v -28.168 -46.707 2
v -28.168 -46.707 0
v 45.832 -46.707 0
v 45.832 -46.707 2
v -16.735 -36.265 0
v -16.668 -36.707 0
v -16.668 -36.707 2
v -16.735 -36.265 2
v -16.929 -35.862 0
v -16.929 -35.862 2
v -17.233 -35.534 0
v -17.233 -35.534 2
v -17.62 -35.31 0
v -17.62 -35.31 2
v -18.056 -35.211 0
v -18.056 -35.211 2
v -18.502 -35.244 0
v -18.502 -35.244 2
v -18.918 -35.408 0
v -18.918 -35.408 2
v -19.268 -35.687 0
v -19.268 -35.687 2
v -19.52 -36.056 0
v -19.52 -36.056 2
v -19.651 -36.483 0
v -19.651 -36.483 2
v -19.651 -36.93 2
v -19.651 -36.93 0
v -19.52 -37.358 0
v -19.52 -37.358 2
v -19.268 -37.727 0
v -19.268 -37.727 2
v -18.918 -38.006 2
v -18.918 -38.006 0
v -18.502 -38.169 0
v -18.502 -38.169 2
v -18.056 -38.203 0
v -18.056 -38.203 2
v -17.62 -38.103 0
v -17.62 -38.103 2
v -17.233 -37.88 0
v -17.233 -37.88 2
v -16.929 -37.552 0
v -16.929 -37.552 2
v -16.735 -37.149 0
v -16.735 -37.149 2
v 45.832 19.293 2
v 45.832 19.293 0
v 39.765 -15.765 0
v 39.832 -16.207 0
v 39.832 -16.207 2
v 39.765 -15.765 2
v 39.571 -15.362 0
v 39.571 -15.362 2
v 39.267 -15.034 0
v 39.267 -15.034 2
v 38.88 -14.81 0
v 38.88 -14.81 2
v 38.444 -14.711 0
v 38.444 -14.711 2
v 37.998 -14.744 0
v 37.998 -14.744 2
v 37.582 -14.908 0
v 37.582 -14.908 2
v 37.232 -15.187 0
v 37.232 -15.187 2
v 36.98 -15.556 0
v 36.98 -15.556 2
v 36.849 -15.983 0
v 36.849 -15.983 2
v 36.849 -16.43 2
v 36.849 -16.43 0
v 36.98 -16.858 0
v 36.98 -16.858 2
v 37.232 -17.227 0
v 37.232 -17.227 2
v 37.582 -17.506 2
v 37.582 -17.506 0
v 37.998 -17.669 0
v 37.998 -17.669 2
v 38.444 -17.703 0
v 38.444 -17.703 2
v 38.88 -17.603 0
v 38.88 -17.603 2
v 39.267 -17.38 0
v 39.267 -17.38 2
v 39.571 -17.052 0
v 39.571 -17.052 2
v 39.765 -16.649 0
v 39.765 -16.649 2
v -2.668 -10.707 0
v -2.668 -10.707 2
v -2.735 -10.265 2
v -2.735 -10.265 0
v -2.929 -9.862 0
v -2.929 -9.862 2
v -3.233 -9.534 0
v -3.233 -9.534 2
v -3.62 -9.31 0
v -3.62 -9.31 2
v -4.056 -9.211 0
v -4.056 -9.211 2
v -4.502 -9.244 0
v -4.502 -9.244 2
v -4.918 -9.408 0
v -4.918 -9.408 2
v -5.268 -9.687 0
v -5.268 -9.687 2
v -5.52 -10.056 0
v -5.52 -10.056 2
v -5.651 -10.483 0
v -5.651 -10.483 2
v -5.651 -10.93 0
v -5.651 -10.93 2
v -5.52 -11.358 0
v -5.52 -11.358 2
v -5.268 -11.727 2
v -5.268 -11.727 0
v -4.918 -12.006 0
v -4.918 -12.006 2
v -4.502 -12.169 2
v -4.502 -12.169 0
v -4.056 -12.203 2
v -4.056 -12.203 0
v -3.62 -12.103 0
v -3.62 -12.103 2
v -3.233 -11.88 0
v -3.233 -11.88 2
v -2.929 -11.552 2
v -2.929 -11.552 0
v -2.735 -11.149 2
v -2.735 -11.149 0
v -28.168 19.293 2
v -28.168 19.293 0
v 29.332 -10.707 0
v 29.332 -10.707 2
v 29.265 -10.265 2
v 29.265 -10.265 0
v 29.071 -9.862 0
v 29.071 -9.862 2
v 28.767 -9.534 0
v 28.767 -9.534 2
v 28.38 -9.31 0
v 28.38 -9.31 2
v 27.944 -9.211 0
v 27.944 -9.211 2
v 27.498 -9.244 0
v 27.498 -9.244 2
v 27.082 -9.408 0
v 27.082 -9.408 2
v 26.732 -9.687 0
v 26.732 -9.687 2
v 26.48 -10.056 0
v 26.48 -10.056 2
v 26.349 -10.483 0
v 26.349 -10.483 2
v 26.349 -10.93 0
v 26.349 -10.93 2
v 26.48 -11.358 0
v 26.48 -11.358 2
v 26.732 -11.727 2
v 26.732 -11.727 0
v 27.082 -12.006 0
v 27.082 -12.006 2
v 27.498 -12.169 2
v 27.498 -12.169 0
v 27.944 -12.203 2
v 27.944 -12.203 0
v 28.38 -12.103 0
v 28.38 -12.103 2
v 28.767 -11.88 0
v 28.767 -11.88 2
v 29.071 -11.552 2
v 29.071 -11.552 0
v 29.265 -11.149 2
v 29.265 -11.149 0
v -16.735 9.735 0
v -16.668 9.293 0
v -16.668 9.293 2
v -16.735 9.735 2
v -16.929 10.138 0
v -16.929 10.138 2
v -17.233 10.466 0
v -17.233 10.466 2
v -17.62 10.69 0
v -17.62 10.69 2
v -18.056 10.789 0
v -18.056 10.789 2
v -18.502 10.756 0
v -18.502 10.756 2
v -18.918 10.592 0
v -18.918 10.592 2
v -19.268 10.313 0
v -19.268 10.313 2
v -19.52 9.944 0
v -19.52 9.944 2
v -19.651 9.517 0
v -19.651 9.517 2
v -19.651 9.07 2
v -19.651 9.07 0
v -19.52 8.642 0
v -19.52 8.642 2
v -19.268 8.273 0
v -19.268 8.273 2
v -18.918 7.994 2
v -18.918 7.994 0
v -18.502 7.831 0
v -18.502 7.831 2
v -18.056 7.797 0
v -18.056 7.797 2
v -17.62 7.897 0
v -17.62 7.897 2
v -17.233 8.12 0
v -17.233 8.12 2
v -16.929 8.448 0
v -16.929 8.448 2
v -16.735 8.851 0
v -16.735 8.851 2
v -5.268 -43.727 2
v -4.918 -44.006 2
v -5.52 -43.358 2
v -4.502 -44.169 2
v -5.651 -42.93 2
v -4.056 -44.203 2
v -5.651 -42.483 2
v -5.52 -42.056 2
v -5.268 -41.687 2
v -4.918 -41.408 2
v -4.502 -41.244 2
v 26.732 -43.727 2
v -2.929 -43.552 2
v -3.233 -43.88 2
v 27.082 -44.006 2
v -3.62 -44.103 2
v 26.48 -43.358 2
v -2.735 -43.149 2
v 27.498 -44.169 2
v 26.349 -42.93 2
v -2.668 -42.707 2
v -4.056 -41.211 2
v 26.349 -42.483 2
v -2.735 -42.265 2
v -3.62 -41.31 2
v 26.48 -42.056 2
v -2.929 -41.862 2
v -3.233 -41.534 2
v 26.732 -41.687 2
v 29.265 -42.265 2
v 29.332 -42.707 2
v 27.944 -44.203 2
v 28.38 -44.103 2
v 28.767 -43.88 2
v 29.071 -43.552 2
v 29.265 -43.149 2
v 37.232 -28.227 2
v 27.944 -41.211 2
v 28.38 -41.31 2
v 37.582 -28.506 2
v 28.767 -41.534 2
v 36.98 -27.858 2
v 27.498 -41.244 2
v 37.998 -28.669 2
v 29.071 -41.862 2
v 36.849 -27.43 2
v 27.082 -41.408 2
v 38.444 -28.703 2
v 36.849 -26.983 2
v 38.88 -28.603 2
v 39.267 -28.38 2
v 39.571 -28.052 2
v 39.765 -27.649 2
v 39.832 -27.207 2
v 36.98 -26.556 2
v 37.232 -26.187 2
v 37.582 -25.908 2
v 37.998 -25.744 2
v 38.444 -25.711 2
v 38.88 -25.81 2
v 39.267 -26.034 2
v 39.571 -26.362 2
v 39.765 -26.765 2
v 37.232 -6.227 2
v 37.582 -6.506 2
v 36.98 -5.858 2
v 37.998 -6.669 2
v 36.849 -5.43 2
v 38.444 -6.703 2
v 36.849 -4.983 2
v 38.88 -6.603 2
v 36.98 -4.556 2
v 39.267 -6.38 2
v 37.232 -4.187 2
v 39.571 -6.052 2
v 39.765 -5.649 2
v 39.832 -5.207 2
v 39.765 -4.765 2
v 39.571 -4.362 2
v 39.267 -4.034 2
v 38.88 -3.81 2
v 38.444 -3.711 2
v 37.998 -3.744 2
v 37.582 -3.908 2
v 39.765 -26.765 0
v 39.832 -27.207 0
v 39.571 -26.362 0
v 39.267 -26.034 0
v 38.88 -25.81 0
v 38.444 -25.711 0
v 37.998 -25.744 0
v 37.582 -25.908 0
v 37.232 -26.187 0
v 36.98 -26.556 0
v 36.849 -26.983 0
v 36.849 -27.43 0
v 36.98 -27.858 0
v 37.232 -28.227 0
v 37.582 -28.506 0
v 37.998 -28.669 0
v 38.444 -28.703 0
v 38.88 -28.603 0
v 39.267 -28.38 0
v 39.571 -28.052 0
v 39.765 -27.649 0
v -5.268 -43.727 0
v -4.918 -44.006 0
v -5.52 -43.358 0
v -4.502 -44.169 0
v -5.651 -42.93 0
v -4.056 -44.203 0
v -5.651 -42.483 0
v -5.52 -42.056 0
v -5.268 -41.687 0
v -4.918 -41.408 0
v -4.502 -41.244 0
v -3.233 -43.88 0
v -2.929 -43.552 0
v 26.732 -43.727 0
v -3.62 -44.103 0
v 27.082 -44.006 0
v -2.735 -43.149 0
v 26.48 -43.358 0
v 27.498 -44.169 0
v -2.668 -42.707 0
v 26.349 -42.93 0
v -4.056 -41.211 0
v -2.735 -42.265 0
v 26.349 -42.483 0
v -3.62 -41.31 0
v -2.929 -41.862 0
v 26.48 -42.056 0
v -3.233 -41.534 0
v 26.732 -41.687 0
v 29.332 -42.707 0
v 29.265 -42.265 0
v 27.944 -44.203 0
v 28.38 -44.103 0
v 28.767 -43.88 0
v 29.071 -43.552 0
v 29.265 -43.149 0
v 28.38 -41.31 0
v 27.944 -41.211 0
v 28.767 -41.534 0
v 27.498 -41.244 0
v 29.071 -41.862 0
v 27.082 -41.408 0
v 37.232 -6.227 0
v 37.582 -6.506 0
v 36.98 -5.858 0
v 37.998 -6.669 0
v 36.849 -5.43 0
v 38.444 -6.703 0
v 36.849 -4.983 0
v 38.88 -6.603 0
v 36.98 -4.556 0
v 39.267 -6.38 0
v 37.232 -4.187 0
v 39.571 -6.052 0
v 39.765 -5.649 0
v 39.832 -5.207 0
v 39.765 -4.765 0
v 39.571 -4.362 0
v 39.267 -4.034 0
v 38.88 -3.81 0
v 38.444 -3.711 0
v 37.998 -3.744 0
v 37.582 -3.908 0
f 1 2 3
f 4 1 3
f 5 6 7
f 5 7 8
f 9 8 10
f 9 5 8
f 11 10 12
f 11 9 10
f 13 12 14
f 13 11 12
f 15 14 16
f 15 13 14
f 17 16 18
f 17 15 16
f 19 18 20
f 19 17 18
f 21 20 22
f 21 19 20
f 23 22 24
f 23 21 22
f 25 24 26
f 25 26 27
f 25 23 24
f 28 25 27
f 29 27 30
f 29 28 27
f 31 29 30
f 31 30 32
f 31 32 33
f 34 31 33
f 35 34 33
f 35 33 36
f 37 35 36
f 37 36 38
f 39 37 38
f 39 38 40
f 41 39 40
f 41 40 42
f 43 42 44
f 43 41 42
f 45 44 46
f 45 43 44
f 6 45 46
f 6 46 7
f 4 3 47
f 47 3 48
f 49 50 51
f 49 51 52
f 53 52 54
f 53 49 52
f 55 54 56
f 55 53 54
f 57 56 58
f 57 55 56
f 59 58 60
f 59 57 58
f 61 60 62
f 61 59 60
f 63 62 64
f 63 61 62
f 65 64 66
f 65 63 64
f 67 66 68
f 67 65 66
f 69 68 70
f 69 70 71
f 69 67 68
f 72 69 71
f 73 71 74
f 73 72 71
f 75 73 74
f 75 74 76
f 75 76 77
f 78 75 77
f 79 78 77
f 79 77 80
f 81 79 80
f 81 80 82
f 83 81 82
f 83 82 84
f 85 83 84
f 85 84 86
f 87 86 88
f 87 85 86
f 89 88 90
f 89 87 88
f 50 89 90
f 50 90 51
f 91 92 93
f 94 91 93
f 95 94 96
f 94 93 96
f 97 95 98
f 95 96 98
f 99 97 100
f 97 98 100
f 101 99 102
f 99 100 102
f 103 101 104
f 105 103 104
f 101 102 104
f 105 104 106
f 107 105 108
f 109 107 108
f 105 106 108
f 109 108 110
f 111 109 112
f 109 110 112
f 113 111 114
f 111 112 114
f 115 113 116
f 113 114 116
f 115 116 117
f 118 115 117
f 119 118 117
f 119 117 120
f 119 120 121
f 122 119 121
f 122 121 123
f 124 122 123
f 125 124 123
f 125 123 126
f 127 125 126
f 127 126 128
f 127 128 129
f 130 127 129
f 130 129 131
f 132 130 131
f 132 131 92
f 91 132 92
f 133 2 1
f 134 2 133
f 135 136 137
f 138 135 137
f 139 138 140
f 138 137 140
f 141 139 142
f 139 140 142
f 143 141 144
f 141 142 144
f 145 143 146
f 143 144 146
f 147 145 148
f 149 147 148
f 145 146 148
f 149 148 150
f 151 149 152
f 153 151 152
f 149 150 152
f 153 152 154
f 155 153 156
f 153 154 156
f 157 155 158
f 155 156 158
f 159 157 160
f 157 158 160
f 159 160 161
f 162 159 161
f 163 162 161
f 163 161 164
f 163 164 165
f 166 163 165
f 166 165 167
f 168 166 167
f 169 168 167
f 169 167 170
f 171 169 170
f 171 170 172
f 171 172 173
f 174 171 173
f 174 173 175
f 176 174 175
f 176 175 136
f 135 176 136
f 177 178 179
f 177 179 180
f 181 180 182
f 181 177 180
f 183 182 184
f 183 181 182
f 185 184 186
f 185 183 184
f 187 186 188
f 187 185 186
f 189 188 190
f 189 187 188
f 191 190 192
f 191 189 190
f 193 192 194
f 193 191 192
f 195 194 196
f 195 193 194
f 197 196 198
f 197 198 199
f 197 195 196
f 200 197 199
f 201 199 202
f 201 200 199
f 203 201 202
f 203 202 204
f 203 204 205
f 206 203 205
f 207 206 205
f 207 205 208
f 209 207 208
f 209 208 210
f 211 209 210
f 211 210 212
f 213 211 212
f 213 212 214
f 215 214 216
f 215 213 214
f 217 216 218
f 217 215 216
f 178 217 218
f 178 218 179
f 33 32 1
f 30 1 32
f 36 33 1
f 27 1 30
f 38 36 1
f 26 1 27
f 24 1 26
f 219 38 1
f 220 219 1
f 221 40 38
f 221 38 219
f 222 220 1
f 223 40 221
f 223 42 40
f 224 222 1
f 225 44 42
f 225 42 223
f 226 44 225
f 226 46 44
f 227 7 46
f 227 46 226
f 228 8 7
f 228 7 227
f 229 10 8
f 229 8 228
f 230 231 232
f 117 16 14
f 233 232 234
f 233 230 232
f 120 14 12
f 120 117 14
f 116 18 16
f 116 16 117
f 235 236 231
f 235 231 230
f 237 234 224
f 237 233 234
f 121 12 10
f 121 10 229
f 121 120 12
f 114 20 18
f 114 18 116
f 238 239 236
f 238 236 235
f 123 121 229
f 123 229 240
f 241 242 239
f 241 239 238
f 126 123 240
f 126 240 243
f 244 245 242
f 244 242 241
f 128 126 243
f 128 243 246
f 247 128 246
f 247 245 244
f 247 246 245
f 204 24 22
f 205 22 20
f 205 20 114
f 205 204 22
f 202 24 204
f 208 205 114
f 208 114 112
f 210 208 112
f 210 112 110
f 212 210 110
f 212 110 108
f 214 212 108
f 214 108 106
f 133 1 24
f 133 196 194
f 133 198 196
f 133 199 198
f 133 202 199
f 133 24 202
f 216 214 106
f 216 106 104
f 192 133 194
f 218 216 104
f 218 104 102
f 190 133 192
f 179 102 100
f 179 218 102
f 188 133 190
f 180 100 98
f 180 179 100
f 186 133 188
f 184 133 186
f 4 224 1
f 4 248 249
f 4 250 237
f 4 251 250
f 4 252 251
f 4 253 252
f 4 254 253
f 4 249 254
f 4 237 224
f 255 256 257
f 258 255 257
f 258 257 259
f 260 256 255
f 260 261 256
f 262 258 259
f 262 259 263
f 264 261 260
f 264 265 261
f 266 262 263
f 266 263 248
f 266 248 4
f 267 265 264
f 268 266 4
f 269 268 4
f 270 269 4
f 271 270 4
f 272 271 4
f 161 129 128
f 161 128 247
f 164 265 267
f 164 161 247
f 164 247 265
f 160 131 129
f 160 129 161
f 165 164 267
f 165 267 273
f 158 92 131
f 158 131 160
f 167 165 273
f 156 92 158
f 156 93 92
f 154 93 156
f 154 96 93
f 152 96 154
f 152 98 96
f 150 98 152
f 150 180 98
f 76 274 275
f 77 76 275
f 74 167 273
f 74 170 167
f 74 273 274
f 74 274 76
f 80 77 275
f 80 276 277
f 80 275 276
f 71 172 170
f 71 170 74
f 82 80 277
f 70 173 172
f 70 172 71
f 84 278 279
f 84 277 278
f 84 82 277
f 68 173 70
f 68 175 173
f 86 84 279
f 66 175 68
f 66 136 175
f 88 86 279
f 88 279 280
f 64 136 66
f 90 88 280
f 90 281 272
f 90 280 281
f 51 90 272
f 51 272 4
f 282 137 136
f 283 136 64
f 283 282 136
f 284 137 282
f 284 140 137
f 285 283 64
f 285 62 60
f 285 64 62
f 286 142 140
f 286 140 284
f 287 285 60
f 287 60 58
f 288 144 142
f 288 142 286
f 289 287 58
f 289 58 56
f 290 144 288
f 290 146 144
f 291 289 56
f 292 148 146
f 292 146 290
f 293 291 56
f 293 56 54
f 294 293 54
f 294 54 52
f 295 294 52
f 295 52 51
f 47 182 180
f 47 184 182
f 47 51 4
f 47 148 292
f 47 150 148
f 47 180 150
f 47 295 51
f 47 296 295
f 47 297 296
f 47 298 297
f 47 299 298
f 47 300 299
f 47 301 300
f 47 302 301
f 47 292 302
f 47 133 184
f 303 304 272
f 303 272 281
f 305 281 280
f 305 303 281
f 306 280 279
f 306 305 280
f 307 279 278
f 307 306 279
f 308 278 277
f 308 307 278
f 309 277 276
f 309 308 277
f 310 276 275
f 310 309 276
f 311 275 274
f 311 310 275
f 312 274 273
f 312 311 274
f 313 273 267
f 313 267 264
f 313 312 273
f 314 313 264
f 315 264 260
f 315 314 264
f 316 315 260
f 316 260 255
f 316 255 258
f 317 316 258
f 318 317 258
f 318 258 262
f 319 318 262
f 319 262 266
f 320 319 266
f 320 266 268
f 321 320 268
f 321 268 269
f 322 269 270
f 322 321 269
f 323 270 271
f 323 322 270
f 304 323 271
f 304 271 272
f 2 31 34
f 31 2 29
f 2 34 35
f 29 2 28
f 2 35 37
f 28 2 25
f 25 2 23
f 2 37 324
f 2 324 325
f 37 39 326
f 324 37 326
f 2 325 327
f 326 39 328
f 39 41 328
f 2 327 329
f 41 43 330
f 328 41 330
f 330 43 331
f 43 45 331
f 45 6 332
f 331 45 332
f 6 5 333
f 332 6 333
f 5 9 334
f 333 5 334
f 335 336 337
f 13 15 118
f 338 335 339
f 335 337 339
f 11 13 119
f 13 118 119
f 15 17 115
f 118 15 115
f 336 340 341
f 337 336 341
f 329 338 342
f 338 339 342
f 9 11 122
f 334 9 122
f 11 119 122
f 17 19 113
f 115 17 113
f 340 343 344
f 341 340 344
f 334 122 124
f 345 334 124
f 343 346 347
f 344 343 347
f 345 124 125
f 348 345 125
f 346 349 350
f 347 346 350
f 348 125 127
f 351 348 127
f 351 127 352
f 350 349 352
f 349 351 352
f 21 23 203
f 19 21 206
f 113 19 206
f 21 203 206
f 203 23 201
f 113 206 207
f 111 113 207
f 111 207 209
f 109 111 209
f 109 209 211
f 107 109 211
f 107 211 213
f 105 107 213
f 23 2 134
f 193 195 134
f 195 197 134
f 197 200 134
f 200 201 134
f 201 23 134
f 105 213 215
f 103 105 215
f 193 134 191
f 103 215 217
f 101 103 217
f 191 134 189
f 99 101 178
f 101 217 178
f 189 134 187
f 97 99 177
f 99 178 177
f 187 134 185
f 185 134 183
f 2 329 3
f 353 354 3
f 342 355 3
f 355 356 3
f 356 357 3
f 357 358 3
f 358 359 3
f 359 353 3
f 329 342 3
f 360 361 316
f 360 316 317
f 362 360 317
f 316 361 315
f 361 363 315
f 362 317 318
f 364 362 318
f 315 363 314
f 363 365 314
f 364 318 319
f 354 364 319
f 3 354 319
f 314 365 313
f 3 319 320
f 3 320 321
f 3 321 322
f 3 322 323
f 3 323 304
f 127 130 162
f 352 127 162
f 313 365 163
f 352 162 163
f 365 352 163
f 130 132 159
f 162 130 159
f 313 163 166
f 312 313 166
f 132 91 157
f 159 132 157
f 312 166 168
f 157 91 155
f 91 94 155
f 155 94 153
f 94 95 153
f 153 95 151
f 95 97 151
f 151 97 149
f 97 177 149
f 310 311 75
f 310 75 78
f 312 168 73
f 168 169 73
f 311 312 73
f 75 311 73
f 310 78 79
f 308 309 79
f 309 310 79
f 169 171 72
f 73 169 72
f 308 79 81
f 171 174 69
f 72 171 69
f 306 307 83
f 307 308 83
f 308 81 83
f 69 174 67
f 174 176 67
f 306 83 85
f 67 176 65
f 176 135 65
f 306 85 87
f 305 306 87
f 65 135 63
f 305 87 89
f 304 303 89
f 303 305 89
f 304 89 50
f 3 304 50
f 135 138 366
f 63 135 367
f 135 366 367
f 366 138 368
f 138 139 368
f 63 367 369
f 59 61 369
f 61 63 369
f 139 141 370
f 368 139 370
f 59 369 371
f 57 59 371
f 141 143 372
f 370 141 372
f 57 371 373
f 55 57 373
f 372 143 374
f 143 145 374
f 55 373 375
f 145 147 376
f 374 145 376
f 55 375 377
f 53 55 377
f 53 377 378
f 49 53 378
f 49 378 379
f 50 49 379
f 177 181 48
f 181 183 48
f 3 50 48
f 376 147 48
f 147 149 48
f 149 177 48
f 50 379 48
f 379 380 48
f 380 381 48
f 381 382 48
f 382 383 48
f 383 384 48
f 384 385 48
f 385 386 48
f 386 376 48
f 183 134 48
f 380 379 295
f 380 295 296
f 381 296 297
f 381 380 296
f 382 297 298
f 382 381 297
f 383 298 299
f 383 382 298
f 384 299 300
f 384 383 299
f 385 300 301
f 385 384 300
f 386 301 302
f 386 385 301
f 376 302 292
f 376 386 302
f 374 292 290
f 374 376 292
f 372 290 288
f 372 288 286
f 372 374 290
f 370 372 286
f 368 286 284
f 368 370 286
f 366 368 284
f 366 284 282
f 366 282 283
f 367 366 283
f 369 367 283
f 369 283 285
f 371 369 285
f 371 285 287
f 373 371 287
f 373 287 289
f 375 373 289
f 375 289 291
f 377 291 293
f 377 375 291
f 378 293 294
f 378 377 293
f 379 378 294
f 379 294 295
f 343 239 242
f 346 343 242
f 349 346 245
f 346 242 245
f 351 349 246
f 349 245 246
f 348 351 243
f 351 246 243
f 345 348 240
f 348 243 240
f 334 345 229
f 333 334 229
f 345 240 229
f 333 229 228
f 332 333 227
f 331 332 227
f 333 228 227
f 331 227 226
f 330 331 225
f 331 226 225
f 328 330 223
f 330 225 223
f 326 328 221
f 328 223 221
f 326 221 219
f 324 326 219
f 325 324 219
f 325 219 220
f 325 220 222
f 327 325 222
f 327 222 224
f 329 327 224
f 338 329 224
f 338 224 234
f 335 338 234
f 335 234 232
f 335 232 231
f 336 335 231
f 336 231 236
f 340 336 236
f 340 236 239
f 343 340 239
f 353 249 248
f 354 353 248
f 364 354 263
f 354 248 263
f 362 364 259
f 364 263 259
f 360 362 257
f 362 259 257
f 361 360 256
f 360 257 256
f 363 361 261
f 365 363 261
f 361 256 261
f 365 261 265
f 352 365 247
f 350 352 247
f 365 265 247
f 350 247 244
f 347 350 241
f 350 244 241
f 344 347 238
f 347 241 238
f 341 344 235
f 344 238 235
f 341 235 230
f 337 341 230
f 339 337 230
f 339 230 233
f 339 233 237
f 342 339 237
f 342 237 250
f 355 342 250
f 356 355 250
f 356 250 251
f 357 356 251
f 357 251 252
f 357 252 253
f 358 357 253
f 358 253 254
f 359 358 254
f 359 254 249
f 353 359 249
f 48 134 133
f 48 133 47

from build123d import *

# Parameters (mm, degrees)
ESQUISSE1_W      = 74
ESQUISSE1_H      = 66
ESQUISSE1_R      = 1.5
EXTRUSION1_DEPTH = 2
ESQUISSE2_R      = 1.5
EXTRUSION2_DEPTH = 10


with BuildPart() as part:
    # Esquisse1 → Extrusion1 (new body)
    with BuildSketch(Plane.XY):
        with Locations((8.831885794, -13.706808511)):
            Rectangle(ESQUISSE1_W, ESQUISSE1_H)
        with Locations((-18.168114206, 9.293191489)):
            Circle(ESQUISSE1_R, mode=Mode.SUBTRACT)
        with Locations((-18.168114206, -36.706808511)):
            Circle(ESQUISSE1_R, mode=Mode.SUBTRACT)
        with Locations((38.331885794, -5.206808511)):
            Circle(ESQUISSE1_R, mode=Mode.SUBTRACT)
        with Locations((38.331885794, -27.206808511)):
            Circle(ESQUISSE1_R, mode=Mode.SUBTRACT)
        with Locations((38.331885794, -16.206808511)):
            Circle(ESQUISSE1_R, mode=Mode.SUBTRACT)
    extrude(amount=EXTRUSION1_DEPTH)

    # Esquisse2 → Extrusion2 (cut)
    with BuildSketch(Plane.XY.offset(2)):
        with Locations((27.831885794, -10.706808511)):
            Circle(ESQUISSE2_R)
        with Locations((-4.168114206, -10.706808511)):
            Circle(ESQUISSE2_R)
        with Locations((-4.168114206, -42.706808511)):
            Circle(ESQUISSE2_R)
        with Locations((27.831885794, -42.706808511)):
            Circle(ESQUISSE2_R)
    extrude(amount=-EXTRUSION2_DEPTH, mode=Mode.SUBTRACT)


solid = part.part
